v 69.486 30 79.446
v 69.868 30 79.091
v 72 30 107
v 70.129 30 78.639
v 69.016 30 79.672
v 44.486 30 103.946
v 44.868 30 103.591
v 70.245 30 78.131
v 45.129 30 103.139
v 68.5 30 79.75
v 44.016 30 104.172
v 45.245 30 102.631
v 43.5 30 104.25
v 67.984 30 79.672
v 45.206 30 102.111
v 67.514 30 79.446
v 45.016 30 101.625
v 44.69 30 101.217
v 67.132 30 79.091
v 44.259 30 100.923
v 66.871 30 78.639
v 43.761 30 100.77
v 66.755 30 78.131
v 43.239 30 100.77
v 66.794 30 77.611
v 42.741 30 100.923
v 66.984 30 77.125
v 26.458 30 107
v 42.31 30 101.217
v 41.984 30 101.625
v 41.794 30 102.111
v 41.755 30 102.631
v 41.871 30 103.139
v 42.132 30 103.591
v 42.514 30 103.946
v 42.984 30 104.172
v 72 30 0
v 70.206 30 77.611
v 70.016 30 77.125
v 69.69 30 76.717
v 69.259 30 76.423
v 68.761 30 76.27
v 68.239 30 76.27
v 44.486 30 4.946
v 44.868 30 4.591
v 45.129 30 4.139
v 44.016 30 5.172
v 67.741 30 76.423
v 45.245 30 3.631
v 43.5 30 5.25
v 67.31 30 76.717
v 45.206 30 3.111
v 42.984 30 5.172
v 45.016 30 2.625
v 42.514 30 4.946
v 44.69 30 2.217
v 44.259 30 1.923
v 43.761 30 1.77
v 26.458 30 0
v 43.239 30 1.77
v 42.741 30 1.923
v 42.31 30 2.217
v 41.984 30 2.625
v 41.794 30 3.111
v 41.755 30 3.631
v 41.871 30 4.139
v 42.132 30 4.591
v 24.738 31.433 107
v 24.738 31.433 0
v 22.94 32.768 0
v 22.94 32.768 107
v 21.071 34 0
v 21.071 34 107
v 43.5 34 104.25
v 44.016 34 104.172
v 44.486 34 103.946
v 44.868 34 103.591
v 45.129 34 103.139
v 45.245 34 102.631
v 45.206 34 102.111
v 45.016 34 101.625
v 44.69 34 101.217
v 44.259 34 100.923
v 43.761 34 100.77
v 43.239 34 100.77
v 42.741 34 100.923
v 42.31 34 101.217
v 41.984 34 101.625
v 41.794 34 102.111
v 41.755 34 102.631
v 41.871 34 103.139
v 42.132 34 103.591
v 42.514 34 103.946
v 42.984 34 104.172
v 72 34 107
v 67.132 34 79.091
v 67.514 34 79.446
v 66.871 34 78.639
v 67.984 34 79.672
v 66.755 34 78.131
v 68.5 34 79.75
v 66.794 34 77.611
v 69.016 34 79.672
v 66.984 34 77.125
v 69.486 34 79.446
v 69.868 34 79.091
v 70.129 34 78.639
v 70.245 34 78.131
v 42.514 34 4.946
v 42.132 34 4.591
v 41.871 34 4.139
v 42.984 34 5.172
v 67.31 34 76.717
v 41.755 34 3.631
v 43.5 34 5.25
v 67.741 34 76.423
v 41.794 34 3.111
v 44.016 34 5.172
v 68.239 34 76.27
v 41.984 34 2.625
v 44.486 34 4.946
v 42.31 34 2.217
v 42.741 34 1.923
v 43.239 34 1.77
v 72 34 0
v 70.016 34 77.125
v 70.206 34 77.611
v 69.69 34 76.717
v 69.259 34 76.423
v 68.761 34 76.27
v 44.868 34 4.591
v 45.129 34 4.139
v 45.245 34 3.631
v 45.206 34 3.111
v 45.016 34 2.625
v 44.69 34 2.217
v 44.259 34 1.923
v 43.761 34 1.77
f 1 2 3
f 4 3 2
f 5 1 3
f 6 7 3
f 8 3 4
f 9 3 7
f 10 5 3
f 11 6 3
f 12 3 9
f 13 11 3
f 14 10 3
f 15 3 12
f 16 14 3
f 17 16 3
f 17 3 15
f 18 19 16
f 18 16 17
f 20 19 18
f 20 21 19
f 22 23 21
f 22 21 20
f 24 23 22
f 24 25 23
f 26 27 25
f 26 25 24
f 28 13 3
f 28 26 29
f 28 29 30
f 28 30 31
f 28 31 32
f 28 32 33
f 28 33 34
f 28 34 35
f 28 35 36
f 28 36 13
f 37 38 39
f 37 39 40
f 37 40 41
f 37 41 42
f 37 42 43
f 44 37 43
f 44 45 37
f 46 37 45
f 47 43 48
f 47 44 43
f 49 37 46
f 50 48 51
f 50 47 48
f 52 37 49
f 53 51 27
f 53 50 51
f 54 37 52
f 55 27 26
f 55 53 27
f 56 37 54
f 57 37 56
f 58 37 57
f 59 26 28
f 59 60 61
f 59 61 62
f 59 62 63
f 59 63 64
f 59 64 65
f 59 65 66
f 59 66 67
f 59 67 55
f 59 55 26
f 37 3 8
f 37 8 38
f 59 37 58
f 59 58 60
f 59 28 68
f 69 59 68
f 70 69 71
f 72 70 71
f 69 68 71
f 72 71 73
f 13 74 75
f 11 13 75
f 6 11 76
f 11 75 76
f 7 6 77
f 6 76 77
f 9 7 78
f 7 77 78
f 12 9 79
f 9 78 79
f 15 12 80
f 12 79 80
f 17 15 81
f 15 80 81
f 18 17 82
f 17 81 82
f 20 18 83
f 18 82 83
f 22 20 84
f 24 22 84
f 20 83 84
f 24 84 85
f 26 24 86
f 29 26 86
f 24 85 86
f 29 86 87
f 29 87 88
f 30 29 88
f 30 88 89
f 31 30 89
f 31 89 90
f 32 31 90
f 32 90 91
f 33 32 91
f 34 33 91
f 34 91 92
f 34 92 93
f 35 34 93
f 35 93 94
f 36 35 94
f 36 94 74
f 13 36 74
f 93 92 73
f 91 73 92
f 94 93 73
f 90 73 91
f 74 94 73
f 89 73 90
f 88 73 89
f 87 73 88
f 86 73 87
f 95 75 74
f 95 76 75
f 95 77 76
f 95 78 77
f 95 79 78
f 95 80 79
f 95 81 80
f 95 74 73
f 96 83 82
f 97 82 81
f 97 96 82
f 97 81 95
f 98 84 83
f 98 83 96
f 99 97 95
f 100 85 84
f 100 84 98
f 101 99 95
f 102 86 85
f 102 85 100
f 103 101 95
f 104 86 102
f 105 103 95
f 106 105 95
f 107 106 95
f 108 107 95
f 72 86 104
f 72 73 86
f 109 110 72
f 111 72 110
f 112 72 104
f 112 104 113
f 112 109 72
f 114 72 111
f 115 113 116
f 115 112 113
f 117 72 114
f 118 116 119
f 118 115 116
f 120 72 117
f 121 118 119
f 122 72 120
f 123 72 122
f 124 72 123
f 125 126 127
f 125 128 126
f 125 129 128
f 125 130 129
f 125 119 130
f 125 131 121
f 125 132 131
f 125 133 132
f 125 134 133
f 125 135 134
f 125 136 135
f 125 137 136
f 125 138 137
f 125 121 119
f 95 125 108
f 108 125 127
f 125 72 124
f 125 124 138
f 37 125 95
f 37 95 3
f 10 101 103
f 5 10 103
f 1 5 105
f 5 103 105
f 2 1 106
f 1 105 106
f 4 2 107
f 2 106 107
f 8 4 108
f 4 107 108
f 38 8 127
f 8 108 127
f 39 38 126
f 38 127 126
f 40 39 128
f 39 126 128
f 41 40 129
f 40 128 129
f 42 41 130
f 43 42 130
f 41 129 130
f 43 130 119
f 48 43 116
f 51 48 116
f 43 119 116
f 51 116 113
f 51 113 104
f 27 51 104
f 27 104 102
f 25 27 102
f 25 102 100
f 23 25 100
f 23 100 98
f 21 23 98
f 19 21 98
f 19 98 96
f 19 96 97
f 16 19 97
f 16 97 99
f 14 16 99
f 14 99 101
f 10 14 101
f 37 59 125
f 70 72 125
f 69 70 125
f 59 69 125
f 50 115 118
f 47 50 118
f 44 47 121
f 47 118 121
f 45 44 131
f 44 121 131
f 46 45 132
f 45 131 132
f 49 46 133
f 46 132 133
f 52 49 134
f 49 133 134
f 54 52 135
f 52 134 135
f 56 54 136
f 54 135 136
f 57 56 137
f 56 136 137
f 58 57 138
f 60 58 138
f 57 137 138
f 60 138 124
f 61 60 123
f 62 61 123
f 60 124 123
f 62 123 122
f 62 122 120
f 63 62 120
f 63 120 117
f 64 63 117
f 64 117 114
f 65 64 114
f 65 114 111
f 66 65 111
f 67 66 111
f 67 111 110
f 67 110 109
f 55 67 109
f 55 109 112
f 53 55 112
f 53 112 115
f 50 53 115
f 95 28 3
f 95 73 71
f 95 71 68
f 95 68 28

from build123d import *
from build123d.topology import SkipClean

# Parameters (mm, degrees)
SKETCH1_R                      = 40
SKETCH1_R_2                    = 38
BOSS_EXTRUDE1_DEPTH            = 200
SKETCH2_R                      = 40
BOSS_EXTRUDE2_DEPTH            = 2
BOSS_EXTRUDE3_DEPTH            = 107
BOSS_EXTRUDE4_DEPTH            = 2
SKETCH5_R                      = 1.75
CUT_EXTRUDE1_DEPTH             = 226.077764339
CUT_EXTRUDE2_REACH             = 218.296
SKETCH6_R                      = 4
CUT_EXTRUDE2_DIRECTION_2_REACH = 218.296
CIRPATTERN1_COUNT              = 2
CIRPATTERN1_ANGLE              = 90
BOSS_EXTRUDE5_REACH            = 241.742
BOSS_EXTRUDE5_END_RADIUS       = 40
SKETCH7_W                      = 14
SKETCH7_H                      = 2
CUT_EXTRUDE3_REACH             = 221.073
SKETCH8_R                      = 1.75
FILLET1_R                      = 3
CUT_EXTRUDE4_REACH             = 220.598
SKETCH9_R                      = 0.25
BOSS_EXTRUDE6_START            = 2
BOSS_EXTRUDE6_DEPTH            = 2
SKETCH11_R                     = 38
CUT_EXTRUDE5_DEPTH             = 219.146739623
CUT_EXTRUDE6_DEPTH             = 2


with BuildPart() as part:
    # Sketch1 → Boss-Extrude1 (new body)
    with BuildSketch(Plane.XY):
        Circle(SKETCH1_R)
        Circle(SKETCH1_R_2, mode=Mode.SUBTRACT)
    extrude(amount=BOSS_EXTRUDE1_DEPTH)

    # Sketch2 → Boss-Extrude2 (add)
    with BuildSketch(Plane.XY.offset(180)):
        Circle(SKETCH2_R)
    extrude(amount=BOSS_EXTRUDE2_DEPTH)

    # Sketch3 → Boss-Extrude3 (add)
    with BuildSketch(Plane(origin=(0, 0, 0), x_dir=(-1, 0, 0), z_dir=(0, 0, -1))):
        with BuildLine():
            Line((-21.071307506, -34), (-72, -34))
            Line((-72, -34), (-72, -30))
            Line((-72, -30), (-26.457513111, -30))
            ThreePointArc((-26.457513111, -30), (-23.848421275, -32.113125085), (-21.071307506, -34))
        make_face()
        with BuildLine():
            Line((-21.071307506, 34), (-72, 34))
            Line((-72, 34), (-72, 30))
            Line((-72, 30), (-26.457513111, 30))
            ThreePointArc((-26.457513111, 30), (-23.848421275, 32.113125085), (-21.071307506, 34))
        make_face()
    extrude(amount=-BOSS_EXTRUDE3_DEPTH)

    # Sketch4 → Boss-Extrude4 (add)
    with BuildSketch(Plane.XY.offset(107)):
        with BuildLine():
            Line((72, -34), (21.071307506, -34))
            ThreePointArc((21.071307506, -34), (40, 0), (21.071307506, 34))
            Line((21.071307506, 34), (72, 34))
            Line((72, 34), (72, -34))
        make_face()
    extrude(amount=BOSS_EXTRUDE4_DEPTH)

    # Sketch5 → Cut-Extrude1 (cut, through all)
    with BuildSketch(Plane(origin=(0, 34, 0), x_dir=(1, 0, 0), z_dir=(0, 1, 0))):
        with Locations(Location((43.5, -102.5, 0), (0, 0, 270))):
            Circle(SKETCH5_R)
        with Locations(Location((43.5, -3.5, 0), (0, 0, 270))):
            Circle(SKETCH5_R)
        with Locations(Location((68.5, -78, 0), (0, 0, 270))):
            Circle(SKETCH5_R)
    extrude(amount=-CUT_EXTRUDE1_DEPTH, mode=Mode.SUBTRACT)

    # Sketch6 → Cut-Extrude2 (cut, up to next)
    with BuildSketch(Plane(origin=(0, 0, 0), x_dir=(0, 0, 1), z_dir=(-0.7071067811865488, 0.7071067811865464, 0)), mode=Mode.PRIVATE) as cut_extrude2_sk1:
        with Locations(Location((187, 0, 0), (0, 0, 90))):
            Circle(SKETCH6_R)
    cut_extrude2_tool1 = extrude(cut_extrude2_sk1.sketch, amount=-CUT_EXTRUDE2_REACH, mode=Mode.PRIVATE) & part.part
    cut_extrude2 = cut_extrude2_tool1.solids().sort_by_distance((0, 0, 187))[0]
    add(cut_extrude2, mode=Mode.SUBTRACT)

    # Sketch6 → Cut-Extrude2 direction 2 (cut, up to next)
    with BuildSketch(Plane(origin=(0, 0, 0), x_dir=(0, 0, 1), z_dir=(-0.7071067811865488, 0.7071067811865464, 0)), mode=Mode.PRIVATE) as cut_extrude2_direction_2_sk1:
        with Locations(Location((187, 0, 0), (0, 0, 90))):
            Circle(SKETCH6_R)
    cut_extrude2_direction_2_tool1 = extrude(cut_extrude2_direction_2_sk1.sketch, amount=CUT_EXTRUDE2_DIRECTION_2_REACH, mode=Mode.PRIVATE) & part.part
    cut_extrude2_direction_2 = cut_extrude2_direction_2_tool1.solids().sort_by_distance((0, 0, 187))[0]
    add(cut_extrude2_direction_2, mode=Mode.SUBTRACT)

    # CirPattern1: Cut-Extrude2, Cut-Extrude2 direction 2 ×2 about axis
    cirpattern1_axis = Axis((0, 0, -5.35), (0, 0, 1))
    add([cut_extrude2.rotate(cirpattern1_axis, i * CIRPATTERN1_ANGLE / (CIRPATTERN1_COUNT - 1)) for i in range(1, CIRPATTERN1_COUNT)], mode=Mode.SUBTRACT)
    add([cut_extrude2_direction_2.rotate(cirpattern1_axis, i * CIRPATTERN1_ANGLE / (CIRPATTERN1_COUNT - 1)) for i in range(1, CIRPATTERN1_COUNT)], mode=Mode.SUBTRACT)

    # Boss-Extrude5: up to this cylinder (the profile starts outside it)
    boss_extrude5_end = Plane(origin=(0, 0, 7), z_dir=(0, 0, -1)) * Cylinder(BOSS_EXTRUDE5_END_RADIUS, 564.484, mode=Mode.PRIVATE)
    # Sketch7 → Boss-Extrude5 (add, up to the surface)
    with BuildSketch(Plane(origin=(-54, 0, 0), x_dir=(0, 0, -1), z_dir=(1, 0, 0)), mode=Mode.PRIVATE) as boss_extrude5_sk1:
        with Locations((-7, -12)):
            Rectangle(SKETCH7_W, SKETCH7_H)
    boss_extrude5_tool1 = extrude(boss_extrude5_sk1.sketch, amount=BOSS_EXTRUDE5_REACH, mode=Mode.PRIVATE) - boss_extrude5_end
    add(boss_extrude5_tool1.solids().sort_by_distance((-54, -12, 7))[0])
    # Sketch7 → Boss-Extrude5 (add, up to the surface)
    with BuildSketch(Plane(origin=(-54, 0, 0), x_dir=(0, 0, -1), z_dir=(1, 0, 0)), mode=Mode.PRIVATE) as boss_extrude5_sk2:
        with Locations((-7, 12)):
            Rectangle(SKETCH7_W, SKETCH7_H)
    boss_extrude5_tool2 = extrude(boss_extrude5_sk2.sketch, amount=BOSS_EXTRUDE5_REACH, mode=Mode.PRIVATE) - boss_extrude5_end
    add(boss_extrude5_tool2.solids().sort_by_distance((-54, 12, 7))[0])

    # Cut-Extrude3: up to this face of the body (flat: up to its plane)
    cut_extrude3_end = Plane(part.part.faces().sort_by_distance((-45.914280319, 13, 7))[0])
    # Sketch8 → Cut-Extrude3 (cut, up to the picked face)
    with BuildSketch(Plane.XZ.offset(13), mode=Mode.PRIVATE) as cut_extrude3_sk1:
        with Locations(Location((-49.770305539, 5.008755099, 0), (0, 0, 270))):
            Circle(SKETCH8_R)
    cut_extrude3_tool1 = split(extrude(cut_extrude3_sk1.sketch, amount=-CUT_EXTRUDE3_REACH, mode=Mode.PRIVATE), bisect_by=cut_extrude3_end, keep=Keep.BOTH, mode=Mode.PRIVATE)
    add(cut_extrude3_tool1.solids().sort_by(Axis((-49.770306, -13, 5.008755), (0, 1, 0)))[0], mode=Mode.SUBTRACT)

    # Fillet1
    fillet1_edges = [part.edges().sort_by_distance(p)[0] for p in [
        (-54, -12, 14),
        (-54, -12, 0),
        (-54, 12, 0),
        (-54, 12, 14),
    ]]
    fillet(fillet1_edges, radius=FILLET1_R)

    # Sketch9 → Cut-Extrude4 (cut, up to next)
    with BuildSketch(Plane.XZ.offset(-11), mode=Mode.PRIVATE) as cut_extrude4_sk1:
        with Locations(Location((-43.770305539, 7.008755099, 0), (0, 0, 270))):
            Circle(SKETCH9_R)
    cut_extrude4_tool1 = extrude(cut_extrude4_sk1.sketch, amount=-CUT_EXTRUDE4_REACH, mode=Mode.PRIVATE) & part.part
    add(cut_extrude4_tool1.solids().sort_by_distance((-43.770306, 11, 7.008755))[0], mode=Mode.SUBTRACT)

    # Sketch10 → Boss-Extrude6 (add)
    with SkipClean():  # the faces are left unmerged after this step: merging them gives an invalid solid
        with BuildSketch(Plane(origin=(0, 0, 0), x_dir=(-1, 0, 0), z_dir=(0, 0, -1)).offset(BOSS_EXTRUDE6_START)):
            with BuildLine():
                ThreePointArc((10, -36.66060556), (0, -38), (-10, -36.66060556))
                Line((-10, -36.66060556), (-10, -38.729833462))
                ThreePointArc((-10, -38.729833462), (0, -40), (10, -38.729833462))
                Line((10, -38.729833462), (10, -36.66060556))
            make_face()
            with BuildLine():
                ThreePointArc((10, 38.729833462), (0, 40), (-10, 38.729833462))
                Line((-10, 38.729833462), (-10, 36.66060556))
                ThreePointArc((-10, 36.66060556), (0, 38), (10, 36.66060556))
                Line((10, 36.66060556), (10, 38.729833462))
            make_face()
        extrude(amount=-BOSS_EXTRUDE6_DEPTH)

    # Sketch11 → Cut-Extrude5 (cut, through all)
    # profile 1 of 4: a face of its own
    with BuildSketch(Plane.XY.offset(200)):
        with BuildLine():
            ThreePointArc((-1.947772516, -39.952549133), (-40, 0), (-1.947772516, 39.952549133))
            ThreePointArc((-1.947772516, 39.952549133), (-79.070653643, 0), (-1.947772516, -39.952549133))
        make_face()
    # profile 2 of 4: a face of its own
    with BuildSketch(Plane.XY.offset(200)):
        with BuildLine():
            ThreePointArc((40, 0), (36.457513111, 16.457513111), (26.457513111, 30))
            ThreePointArc((26.457513111, 30), (23.848421275, 32.113125085), (21.071307506, 34))
            ThreePointArc((21.071307506, 34), (10.014270214, 38.726146104), (-1.947772516, 39.952549133))
            ThreePointArc((-1.947772516, 39.952549133), (-40, 0), (-1.947772516, -39.952549133))
            ThreePointArc((-1.947772516, -39.952549133), (10.014270214, -38.726146104), (21.071307506, -34))
            ThreePointArc((21.071307506, -34), (34.94890771, -19.456974325), (40, 0))
        make_face()
        Circle(SKETCH11_R, mode=Mode.SUBTRACT)
    # profile 3 of 4: a face of its own
    with BuildSketch(Plane.XY.offset(200)):
        with BuildLine():
            Line((72, -34), (72, 30))
            Line((72, 30), (26.457513111, 30))
            ThreePointArc((26.457513111, 30), (36.457513111, 16.457513111), (40, 0))
            ThreePointArc((40, 0), (34.94890771, -19.456974325), (21.071307506, -34))
            Line((21.071307506, -34), (72, -34))
        make_face()
    # profile 4 of 4: a face of its own
    with BuildSketch(Plane.XY.offset(200)):
        Circle(SKETCH11_R)
    extrude(amount=-CUT_EXTRUDE5_DEPTH, mode=Mode.SUBTRACT)

    # Sketch12 → Cut-Extrude6 (cut)
    with BuildSketch(Plane.XY.offset(109)):
        with BuildLine():
            Line((26.457513111, 30), (72, 30))
            Line((72, 30), (72, 34))
            Line((72, 34), (21.071307506, 34))
            ThreePointArc((21.071307506, 34), (23.848421275, 32.113125085), (26.457513111, 30))
        make_face()
    extrude(amount=-CUT_EXTRUDE6_DEPTH, mode=Mode.SUBTRACT)


solid = part.part
